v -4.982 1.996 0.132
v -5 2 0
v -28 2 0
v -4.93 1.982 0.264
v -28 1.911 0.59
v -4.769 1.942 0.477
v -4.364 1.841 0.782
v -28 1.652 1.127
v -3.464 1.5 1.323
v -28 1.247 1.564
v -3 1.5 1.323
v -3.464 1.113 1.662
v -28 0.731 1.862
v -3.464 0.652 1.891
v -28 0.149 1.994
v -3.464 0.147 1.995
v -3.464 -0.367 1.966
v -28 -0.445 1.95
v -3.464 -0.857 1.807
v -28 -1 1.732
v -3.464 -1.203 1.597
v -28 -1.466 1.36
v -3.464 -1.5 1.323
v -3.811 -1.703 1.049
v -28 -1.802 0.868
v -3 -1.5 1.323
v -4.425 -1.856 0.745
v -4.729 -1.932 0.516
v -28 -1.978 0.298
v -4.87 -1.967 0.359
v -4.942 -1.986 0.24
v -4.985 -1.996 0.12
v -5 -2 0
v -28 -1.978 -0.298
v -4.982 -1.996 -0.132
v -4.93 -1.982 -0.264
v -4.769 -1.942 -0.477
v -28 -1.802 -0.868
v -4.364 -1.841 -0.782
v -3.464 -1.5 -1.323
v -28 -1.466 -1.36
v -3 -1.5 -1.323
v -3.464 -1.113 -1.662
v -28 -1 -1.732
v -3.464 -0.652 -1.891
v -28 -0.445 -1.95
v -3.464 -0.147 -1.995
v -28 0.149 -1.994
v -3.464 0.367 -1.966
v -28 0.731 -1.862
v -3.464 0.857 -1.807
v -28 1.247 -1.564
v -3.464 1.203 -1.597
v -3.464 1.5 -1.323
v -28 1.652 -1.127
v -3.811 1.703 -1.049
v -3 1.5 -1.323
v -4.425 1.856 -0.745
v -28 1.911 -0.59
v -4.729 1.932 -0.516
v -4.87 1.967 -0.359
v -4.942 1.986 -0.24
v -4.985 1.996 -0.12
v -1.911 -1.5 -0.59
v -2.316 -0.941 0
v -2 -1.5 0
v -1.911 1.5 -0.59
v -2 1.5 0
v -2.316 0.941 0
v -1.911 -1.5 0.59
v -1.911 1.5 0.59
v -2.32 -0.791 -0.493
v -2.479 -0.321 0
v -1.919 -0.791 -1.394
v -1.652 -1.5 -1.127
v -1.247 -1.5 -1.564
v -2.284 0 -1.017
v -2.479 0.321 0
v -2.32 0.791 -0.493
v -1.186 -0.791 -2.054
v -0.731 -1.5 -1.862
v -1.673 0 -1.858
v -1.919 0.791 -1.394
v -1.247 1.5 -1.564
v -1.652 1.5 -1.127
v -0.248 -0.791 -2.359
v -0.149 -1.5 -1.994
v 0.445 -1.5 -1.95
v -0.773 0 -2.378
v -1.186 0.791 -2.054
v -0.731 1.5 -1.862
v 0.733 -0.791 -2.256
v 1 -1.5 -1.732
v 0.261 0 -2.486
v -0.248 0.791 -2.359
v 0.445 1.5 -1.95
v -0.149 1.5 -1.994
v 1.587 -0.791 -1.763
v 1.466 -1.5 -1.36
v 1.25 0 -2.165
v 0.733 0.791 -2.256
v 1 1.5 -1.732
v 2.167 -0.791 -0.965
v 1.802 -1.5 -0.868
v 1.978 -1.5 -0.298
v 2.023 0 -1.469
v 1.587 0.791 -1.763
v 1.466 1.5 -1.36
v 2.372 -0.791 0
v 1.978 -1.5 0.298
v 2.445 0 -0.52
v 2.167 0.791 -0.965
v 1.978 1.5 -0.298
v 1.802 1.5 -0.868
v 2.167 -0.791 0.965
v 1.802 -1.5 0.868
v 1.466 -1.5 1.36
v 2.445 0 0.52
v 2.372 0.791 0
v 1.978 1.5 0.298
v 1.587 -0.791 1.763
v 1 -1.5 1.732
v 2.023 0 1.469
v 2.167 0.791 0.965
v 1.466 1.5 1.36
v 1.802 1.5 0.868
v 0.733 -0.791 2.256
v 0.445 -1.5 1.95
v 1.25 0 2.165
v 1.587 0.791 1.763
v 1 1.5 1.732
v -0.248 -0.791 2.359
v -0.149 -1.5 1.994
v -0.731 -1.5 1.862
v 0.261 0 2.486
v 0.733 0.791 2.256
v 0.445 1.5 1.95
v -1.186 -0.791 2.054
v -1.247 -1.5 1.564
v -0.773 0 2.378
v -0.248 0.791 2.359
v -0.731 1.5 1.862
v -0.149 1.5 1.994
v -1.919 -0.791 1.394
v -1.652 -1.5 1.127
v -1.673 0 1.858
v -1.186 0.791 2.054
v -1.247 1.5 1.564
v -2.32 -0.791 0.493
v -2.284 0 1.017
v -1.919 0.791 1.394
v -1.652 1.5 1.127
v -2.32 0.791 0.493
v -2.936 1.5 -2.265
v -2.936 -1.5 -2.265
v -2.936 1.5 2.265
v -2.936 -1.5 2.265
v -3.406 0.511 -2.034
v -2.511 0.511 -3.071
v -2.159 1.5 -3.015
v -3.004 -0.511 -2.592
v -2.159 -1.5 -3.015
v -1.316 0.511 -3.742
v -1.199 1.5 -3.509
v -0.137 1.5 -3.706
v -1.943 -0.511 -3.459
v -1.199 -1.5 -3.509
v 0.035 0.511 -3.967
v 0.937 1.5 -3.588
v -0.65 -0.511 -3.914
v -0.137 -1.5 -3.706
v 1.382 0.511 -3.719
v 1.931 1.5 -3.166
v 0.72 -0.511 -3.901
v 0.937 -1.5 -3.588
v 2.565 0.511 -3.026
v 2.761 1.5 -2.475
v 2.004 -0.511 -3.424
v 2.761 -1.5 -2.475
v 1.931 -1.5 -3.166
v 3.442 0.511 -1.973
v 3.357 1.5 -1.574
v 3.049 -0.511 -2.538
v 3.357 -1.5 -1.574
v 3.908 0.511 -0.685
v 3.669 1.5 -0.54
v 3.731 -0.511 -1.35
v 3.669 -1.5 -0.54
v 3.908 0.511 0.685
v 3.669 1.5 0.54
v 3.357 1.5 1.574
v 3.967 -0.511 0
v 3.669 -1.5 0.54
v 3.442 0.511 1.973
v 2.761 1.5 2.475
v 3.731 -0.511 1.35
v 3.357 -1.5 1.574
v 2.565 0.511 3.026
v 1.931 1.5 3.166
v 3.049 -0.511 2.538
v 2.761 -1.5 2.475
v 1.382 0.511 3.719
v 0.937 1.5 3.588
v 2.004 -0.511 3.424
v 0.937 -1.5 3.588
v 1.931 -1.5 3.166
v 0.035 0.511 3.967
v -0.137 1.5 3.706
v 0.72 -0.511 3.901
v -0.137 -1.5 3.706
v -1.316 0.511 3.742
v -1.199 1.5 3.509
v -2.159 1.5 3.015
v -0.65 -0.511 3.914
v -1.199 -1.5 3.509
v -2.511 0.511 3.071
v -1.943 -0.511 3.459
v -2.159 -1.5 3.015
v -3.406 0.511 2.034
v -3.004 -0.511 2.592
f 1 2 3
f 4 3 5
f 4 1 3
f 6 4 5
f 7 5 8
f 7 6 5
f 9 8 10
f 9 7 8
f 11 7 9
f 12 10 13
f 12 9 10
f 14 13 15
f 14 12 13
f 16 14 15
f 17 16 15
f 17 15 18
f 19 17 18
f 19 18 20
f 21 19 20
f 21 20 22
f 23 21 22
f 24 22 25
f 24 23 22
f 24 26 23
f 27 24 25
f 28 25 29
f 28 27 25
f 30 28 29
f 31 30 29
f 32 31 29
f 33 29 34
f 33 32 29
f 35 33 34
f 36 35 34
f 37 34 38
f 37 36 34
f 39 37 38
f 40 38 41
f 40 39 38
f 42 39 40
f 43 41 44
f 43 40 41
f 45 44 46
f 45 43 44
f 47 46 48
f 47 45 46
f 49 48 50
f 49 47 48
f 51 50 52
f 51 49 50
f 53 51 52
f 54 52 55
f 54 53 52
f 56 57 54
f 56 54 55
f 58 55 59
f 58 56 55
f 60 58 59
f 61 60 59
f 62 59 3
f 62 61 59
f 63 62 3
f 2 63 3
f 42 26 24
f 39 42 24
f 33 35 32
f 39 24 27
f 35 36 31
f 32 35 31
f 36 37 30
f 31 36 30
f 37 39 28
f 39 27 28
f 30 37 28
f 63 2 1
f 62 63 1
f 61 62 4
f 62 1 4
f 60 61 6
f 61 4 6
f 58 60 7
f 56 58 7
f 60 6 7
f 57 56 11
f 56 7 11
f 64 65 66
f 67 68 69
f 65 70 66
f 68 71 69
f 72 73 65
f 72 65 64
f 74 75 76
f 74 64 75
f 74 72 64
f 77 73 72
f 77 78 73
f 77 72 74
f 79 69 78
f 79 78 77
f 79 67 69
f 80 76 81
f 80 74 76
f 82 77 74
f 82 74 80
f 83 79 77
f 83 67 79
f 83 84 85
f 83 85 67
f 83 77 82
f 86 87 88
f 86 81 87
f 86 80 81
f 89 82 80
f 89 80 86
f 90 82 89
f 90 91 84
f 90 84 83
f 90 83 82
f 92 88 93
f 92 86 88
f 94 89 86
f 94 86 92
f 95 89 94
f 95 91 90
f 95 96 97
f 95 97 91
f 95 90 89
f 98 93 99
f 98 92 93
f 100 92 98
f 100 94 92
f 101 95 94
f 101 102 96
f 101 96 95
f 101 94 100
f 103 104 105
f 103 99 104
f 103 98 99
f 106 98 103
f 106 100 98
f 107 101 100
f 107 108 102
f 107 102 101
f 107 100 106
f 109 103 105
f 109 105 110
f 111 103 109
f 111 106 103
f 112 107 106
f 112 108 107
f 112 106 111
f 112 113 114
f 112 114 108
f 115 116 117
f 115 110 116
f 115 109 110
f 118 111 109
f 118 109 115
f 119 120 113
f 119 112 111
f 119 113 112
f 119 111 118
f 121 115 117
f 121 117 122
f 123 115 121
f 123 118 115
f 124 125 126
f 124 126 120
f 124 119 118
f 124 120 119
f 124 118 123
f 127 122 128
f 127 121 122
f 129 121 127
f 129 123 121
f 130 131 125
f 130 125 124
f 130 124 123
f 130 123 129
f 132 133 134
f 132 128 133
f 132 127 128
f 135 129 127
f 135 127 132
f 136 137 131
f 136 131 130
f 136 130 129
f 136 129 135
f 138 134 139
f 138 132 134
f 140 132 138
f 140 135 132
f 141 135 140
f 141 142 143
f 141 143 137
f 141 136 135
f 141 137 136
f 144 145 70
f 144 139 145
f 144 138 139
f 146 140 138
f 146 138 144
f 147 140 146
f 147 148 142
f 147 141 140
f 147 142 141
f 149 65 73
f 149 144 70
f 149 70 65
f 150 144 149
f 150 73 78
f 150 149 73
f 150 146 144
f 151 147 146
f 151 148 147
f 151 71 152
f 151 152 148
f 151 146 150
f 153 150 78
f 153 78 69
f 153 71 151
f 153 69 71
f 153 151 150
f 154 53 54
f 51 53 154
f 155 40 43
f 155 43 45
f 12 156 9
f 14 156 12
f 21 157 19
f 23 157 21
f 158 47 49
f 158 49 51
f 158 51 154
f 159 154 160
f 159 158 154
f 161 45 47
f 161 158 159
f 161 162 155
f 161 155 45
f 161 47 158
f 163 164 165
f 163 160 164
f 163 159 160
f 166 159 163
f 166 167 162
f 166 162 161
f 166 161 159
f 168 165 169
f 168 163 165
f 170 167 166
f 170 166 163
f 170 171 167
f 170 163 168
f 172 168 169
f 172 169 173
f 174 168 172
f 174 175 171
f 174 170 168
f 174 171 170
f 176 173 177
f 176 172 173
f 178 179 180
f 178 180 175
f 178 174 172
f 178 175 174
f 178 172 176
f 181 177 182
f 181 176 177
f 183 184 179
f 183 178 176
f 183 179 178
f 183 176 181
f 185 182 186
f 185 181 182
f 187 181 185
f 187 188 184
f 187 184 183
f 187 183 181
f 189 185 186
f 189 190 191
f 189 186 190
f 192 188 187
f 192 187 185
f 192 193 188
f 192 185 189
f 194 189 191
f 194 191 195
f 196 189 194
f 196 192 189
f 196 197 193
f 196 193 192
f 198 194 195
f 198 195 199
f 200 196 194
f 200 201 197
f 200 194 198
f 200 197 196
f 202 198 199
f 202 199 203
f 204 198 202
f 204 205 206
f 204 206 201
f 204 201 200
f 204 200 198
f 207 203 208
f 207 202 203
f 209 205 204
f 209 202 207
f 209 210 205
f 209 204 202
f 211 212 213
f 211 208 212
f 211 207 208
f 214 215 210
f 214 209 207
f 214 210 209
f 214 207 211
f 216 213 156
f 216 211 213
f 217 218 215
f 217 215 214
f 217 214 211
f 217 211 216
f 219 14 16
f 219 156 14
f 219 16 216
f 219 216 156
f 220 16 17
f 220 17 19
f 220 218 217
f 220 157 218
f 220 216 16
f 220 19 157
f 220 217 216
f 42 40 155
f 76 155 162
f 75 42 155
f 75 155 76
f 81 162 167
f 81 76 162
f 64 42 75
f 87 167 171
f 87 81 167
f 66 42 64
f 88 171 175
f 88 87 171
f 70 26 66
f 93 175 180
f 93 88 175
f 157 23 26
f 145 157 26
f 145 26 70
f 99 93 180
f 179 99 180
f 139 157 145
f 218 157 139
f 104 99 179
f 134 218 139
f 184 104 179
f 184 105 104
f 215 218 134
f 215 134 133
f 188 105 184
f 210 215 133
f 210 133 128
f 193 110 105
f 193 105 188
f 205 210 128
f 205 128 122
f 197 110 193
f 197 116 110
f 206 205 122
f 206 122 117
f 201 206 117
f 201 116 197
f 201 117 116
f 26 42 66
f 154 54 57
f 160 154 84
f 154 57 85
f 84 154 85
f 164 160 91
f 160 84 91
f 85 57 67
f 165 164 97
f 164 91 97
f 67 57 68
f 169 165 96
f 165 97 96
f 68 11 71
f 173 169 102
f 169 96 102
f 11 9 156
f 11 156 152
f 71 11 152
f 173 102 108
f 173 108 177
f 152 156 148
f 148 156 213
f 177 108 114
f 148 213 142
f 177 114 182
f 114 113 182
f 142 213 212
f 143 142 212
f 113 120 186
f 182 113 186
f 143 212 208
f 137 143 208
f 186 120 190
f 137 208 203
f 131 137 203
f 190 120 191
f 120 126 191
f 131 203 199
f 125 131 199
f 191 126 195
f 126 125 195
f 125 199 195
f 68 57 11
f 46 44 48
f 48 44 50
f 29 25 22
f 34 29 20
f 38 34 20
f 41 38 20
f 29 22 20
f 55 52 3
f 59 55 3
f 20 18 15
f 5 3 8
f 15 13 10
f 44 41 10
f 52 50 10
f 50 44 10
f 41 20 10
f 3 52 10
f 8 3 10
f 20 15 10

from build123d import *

# Parameters (mm, degrees)
F2_W     = 10
F2_H     = 3
F3_DEPTH = 12.5
F5_R     = 2
F6_DEPTH = 25
F8_DEPTH = 12.5


with BuildPart() as f1:
    # F0 (on Top) → F1 (revolve)
    with BuildSketch(Plane.XY):
        with BuildLine():
            ThreePointArc((0, -2.5), (-2.5, 0), (0, 2.5))
            Line((0, 2.5), (0, 4))
            ThreePointArc((0, 4), (-4, 0), (0, -4))
            Line((0, -4), (0, -2.5))
        make_face()
    revolve(axis=Axis((0, 0, 0), (0, -1, 0)))

    # F2 (on Top) → F3 (intersect, symmetric)
    with BuildSketch(Plane.XY):
        Rectangle(F2_W, F2_H)
    extrude(amount=F3_DEPTH, both=True, mode=Mode.INTERSECT)

    # F5 (on offset) → F6 (join)
    with BuildSketch(Plane.YZ.offset(-3)):
        Circle(F5_R)
    extrude(amount=-F6_DEPTH)

    # F7 (on Top) → F8 (cut, symmetric)
    with BuildSketch(Plane.XY):
        Polygon((-5, 2), (-3, 1.5), (3.708099, 1.5), (9, 1.5), (9, -1.5), (3.708099, -1.5), (-3, -1.5), (-5, -2), (-3, -2), (10, -2), (10, 2), (-3, 2), align=None)
    extrude(amount=F8_DEPTH, both=True, mode=Mode.SUBTRACT)


solid = f1.part
